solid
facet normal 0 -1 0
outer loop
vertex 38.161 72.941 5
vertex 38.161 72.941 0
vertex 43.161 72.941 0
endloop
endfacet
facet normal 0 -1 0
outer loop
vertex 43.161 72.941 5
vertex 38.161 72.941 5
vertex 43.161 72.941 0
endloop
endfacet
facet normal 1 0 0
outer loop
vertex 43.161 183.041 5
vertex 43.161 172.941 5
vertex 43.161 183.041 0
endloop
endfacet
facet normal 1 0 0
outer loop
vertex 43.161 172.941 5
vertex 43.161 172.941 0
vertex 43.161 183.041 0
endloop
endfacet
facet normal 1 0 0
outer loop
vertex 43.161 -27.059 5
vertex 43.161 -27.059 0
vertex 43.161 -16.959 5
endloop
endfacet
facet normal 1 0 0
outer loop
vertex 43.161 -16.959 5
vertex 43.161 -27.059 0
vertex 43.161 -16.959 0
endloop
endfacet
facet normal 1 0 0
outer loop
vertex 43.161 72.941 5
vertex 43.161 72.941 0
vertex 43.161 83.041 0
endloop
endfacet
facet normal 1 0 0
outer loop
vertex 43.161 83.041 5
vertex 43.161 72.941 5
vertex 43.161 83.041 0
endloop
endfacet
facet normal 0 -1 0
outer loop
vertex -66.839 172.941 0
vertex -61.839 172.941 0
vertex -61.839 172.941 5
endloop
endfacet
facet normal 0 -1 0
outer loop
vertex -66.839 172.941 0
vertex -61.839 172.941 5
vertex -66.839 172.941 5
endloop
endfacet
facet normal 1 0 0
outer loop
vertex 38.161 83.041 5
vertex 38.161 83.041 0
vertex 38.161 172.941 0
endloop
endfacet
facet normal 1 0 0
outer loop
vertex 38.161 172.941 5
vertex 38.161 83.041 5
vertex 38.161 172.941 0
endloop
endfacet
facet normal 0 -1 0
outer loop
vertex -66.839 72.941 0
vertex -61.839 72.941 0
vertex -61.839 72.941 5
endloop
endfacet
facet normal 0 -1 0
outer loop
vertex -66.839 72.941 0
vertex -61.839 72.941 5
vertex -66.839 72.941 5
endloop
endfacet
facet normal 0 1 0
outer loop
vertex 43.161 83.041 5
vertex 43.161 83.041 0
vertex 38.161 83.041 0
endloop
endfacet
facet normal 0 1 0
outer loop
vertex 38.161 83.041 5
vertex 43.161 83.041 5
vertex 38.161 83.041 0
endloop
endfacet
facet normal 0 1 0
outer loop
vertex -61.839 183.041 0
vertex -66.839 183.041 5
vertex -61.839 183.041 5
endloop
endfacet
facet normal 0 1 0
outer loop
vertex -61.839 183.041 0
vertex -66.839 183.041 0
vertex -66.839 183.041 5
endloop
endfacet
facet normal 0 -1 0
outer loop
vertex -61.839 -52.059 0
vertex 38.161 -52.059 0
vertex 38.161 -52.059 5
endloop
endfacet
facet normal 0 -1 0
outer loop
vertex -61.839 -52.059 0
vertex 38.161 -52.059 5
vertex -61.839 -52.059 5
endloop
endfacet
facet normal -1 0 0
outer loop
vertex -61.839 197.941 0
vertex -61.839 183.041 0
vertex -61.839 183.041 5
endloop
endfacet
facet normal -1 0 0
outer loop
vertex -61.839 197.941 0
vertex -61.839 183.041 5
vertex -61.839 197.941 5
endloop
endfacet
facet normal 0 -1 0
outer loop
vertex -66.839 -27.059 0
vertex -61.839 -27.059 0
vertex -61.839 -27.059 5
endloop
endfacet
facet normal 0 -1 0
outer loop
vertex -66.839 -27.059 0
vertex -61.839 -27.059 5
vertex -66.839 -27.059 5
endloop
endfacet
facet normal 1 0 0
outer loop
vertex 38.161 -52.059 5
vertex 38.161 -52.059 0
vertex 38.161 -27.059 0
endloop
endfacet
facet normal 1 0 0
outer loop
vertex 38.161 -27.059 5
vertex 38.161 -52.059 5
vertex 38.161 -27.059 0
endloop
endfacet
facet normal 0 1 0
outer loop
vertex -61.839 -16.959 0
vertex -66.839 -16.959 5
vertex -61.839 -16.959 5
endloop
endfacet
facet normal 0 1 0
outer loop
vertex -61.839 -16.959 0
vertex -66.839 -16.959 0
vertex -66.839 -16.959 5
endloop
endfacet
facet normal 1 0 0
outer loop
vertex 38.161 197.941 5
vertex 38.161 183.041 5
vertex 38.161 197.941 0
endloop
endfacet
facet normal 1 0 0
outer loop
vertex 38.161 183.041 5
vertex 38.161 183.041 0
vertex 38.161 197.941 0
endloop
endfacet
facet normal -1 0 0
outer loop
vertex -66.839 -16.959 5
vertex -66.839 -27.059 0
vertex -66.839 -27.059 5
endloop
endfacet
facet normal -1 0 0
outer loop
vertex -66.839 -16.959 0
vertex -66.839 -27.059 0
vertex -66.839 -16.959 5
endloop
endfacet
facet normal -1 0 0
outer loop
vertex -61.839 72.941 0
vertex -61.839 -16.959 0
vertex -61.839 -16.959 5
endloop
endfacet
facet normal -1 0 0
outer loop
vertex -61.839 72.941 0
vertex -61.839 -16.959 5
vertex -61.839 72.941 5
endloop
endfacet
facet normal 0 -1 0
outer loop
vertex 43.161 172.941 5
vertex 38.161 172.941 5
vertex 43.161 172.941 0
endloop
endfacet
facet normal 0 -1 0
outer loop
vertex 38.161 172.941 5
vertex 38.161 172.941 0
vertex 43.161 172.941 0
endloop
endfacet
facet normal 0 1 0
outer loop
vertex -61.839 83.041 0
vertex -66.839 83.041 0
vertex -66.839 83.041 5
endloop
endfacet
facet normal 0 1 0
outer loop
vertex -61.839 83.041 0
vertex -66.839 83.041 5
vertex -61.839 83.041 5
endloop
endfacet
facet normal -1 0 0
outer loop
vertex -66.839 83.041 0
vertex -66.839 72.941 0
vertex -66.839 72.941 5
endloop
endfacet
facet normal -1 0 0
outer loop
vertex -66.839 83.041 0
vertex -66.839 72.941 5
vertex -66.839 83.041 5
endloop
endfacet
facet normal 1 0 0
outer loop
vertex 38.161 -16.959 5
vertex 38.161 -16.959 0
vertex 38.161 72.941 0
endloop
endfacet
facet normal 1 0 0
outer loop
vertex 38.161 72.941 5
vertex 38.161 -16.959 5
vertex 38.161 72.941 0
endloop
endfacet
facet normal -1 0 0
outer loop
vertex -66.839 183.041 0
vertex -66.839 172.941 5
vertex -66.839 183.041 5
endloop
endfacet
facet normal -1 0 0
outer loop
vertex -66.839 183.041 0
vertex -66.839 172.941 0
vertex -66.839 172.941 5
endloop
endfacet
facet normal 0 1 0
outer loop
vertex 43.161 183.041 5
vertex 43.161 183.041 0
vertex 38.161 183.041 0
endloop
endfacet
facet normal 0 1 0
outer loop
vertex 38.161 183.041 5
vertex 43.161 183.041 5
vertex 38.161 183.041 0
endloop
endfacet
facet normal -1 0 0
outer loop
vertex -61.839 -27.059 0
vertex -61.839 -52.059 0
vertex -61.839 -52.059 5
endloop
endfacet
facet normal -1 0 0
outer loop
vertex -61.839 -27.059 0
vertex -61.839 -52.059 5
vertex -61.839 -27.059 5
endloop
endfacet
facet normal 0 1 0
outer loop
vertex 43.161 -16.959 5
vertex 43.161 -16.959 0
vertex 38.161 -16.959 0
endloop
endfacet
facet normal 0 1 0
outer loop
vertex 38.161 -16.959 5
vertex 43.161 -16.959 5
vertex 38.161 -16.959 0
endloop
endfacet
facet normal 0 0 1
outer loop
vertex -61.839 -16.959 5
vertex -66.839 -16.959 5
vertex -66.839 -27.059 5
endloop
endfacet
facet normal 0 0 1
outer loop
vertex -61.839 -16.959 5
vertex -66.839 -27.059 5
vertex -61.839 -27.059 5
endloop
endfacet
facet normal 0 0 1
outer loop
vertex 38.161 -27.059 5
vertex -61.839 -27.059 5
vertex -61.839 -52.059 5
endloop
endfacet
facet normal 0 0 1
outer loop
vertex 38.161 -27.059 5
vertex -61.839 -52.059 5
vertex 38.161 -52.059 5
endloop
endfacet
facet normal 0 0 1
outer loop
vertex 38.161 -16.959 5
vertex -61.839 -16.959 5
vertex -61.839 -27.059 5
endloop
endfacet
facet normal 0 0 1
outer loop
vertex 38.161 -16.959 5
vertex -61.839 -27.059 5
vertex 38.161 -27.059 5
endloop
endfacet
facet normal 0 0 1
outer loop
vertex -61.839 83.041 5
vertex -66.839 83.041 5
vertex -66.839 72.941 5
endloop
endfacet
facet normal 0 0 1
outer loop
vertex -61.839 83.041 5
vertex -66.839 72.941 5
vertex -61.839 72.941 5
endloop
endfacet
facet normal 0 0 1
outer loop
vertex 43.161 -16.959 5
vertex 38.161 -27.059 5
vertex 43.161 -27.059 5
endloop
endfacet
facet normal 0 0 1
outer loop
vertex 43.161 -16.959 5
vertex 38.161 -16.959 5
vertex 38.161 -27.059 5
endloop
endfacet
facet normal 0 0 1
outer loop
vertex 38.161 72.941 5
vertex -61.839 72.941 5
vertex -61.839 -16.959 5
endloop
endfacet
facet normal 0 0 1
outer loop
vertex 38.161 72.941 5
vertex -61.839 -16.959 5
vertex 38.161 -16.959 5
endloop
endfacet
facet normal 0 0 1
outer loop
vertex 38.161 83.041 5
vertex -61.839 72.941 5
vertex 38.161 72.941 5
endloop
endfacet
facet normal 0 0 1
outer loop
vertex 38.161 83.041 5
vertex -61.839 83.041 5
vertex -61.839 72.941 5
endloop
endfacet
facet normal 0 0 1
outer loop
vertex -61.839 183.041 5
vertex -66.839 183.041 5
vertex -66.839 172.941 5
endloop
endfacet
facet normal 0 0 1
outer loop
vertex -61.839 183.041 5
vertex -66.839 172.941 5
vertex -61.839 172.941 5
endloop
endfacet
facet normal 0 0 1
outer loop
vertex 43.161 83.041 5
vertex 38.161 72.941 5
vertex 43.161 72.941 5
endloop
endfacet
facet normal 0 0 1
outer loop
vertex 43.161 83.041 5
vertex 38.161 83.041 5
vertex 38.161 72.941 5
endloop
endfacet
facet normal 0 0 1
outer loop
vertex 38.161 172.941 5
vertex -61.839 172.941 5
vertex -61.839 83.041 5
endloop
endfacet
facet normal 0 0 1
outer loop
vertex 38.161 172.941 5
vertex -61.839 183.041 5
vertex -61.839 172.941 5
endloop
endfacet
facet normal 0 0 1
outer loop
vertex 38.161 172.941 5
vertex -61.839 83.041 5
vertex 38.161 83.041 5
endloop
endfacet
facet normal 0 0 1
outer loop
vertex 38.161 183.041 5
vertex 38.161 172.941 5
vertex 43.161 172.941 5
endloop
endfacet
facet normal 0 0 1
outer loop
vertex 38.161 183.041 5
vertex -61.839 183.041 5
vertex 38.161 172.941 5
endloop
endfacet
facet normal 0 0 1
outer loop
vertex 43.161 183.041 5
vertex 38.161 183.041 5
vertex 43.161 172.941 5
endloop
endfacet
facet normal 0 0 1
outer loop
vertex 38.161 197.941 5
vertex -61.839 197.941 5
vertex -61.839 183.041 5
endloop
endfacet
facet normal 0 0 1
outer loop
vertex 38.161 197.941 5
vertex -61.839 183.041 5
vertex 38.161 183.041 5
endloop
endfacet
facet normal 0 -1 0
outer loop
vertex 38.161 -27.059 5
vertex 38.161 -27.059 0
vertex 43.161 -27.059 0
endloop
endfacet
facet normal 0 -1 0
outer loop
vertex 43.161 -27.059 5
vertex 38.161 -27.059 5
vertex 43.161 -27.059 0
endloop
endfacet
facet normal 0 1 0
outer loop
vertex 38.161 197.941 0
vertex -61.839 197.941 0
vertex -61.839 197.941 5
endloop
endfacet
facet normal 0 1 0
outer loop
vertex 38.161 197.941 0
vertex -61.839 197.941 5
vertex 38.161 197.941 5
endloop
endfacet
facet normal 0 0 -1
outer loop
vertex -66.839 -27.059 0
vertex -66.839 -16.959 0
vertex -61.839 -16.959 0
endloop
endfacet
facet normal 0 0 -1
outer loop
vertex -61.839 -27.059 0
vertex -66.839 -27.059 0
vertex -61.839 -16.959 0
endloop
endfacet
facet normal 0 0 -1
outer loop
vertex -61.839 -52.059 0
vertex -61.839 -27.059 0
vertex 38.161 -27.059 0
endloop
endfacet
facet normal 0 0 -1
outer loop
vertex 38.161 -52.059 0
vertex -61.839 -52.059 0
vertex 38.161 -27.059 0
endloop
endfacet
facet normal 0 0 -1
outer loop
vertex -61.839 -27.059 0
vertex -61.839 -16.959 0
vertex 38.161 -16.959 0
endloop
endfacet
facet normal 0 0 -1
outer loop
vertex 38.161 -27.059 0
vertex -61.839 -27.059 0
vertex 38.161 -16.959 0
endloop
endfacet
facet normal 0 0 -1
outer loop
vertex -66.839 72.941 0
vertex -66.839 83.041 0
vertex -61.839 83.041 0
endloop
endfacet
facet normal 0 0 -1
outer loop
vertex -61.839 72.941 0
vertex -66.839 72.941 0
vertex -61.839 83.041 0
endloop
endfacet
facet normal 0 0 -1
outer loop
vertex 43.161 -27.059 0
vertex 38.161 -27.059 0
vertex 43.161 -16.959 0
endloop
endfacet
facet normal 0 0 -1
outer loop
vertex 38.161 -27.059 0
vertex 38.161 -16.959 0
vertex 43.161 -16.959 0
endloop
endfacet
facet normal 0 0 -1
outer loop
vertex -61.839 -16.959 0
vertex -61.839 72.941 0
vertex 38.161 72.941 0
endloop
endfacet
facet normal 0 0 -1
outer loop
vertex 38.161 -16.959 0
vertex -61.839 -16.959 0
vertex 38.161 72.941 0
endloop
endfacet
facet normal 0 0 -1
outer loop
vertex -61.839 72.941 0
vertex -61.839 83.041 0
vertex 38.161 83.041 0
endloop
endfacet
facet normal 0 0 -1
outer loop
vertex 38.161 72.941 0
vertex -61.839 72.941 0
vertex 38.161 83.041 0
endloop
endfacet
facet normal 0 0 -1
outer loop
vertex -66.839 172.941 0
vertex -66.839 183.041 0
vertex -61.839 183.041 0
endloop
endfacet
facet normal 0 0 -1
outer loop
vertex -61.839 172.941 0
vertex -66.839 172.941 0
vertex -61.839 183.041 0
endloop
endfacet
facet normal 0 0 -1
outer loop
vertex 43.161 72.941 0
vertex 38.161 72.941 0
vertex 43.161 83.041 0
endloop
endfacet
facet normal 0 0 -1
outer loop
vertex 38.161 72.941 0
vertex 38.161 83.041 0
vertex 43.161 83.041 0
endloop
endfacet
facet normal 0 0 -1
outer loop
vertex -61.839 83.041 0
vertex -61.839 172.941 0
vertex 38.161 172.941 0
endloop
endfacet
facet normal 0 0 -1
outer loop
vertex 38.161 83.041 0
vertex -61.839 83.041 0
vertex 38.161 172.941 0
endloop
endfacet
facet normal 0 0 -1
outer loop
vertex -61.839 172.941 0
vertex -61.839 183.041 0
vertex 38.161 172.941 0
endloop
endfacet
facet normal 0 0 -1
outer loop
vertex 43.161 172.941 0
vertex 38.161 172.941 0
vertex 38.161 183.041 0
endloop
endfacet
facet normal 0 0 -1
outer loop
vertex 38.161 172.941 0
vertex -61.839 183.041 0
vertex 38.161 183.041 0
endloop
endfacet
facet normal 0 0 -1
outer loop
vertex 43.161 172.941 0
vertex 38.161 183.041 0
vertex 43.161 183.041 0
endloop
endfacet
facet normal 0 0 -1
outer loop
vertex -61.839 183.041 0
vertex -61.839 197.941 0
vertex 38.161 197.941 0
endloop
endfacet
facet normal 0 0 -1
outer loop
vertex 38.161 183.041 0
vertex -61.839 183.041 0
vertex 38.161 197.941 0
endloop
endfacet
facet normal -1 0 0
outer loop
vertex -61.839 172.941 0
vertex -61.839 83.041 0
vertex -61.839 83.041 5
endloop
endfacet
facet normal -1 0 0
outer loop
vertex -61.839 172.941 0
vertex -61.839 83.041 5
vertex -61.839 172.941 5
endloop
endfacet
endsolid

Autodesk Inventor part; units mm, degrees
ref_plane "YZ Plane" through (0, 0, 0) normal (1, 0, 0) x (0, 1, 0)
ref_plane "XZ Plane" through (0, 0, 0) normal (0, 1, 0) x (-1, 0, 0)
ref_plane "XY Plane" through (0, 0, 0) normal (0, 0, 1) x (1, 0, 0)
sketch "Sketch1" plane through (0, 0, 0) normal (0, 0, 1) x (1, 0, 0)
  line L0 (-61.8393, -52.0586) -> (-61.8393, 197.9414)
  line L1 (-11.8393, -52.0586) -> (-11.8393, 197.9414) construction
  line L2 (38.1607, -52.0586) -> (38.1607, 145.9423)
  line L3 (38.1607, -52.0586) -> (-61.8393, -52.0586)
  line L4 (43.1607, 183.0414) -> (38.1607, 183.0414)
  line L5 (43.1607, 172.9414) -> (43.1607, 183.0414)
  line L6 (38.1607, 172.9414) -> (43.1607, 172.9414)
  line L7 (43.1607, -16.9586) -> (38.1607, -16.9586)
  line L8 (43.1607, -27.0586) -> (43.1607, -16.9586)
  line L9 (38.1607, -27.0586) -> (43.1607, -27.0586)
  line L10 (-61.8393, 83.0414) -> (-61.8393, 72.9414)
  line L11 (-61.8393, 72.9414) -> (38.1607, 72.9414) construction
  line L12 (38.1607, 72.9414) -> (43.1607, 72.9414)
  line L13 (38.1607, 72.9414) -> (43.1607, 72.9414)
  line L14 (43.1607, 72.9414) -> (43.1607, 83.0414)
  line L15 (43.1607, 72.9414) -> (43.1607, 83.0414)
  line L16 (43.1607, 83.0414) -> (38.1607, 83.0414)
  line L17 (43.1607, 83.0414) -> (38.1607, 83.0414)
  line L18 (38.1607, 145.9423) -> (38.1607, 197.9414)
  line L19 (38.1607, 197.9414) -> (38.1607, 147.9414)
  line L20 (38.1607, 147.9414) -> (-61.8393, 147.9414) construction
  line L21 (-66.8393, -27.0586) -> (-66.8393, -16.9586)
  line L22 (-66.8393, -16.9586) -> (-61.8393, -16.9586)
  line L23 (-61.8393, -27.0586) -> (-66.8393, -27.0586)
  line L24 (-66.8393, 83.0414) -> (-61.8393, 83.0414)
  line L25 (-66.8393, 72.9414) -> (-66.8393, 83.0414)
  line L26 (-61.8393, 72.9414) -> (-66.8393, 72.9414)
  line L27 (-66.8393, 172.9414) -> (-66.8393, 183.0414)
  line L28 (-66.8393, 183.0414) -> (-61.8393, 183.0414)
  line L29 (-61.8393, 172.9414) -> (-66.8393, 172.9414)
  line L30 (-61.8393, 197.9414) -> (38.1607, 197.9414)
  line L31 (38.1607, 197.9414) -> (28.1607, 197.9414)
  line L32 (38.1607, 149.2033) -> (38.1607, 197.9414)
  line L33 (-61.8393, 197.9414) -> (-51.8393, 197.9414)
  line L34 (-61.8393, 149.2728) -> (-61.8393, 197.9414)
  line L35 (-61.8393, 147.9414) -> (38.1607, 147.9414) construction
  line L36 (28.1607, 145.2728) -> (28.1607, 139.2728)
  line L37 (17.1607, 145.2728) -> (17.1607, 139.2728)
  line L38 (-40.8393, 145.2728) -> (-40.8393, 139.2728)
  line L39 (-51.8393, 145.2728) -> (-51.8393, 139.2728)
  line L40 (17.1607, 145.2728) -> (-40.8393, 145.2728) construction
  line L41 (17.1607, 139.2728) -> (-40.8393, 139.2728) construction
  line L42 (28.1607, 139.2728) -> (17.1607, 139.2728)
  line L43 (28.1607, 145.2728) -> (17.1607, 145.2728)
  line L44 (-40.8393, 145.2728) -> (-51.8393, 145.2728)
  line L45 (-40.8393, 139.2728) -> (-51.8393, 139.2728)
  line L46 (-51.8393, 139.2728) -> (-61.8393, 139.2728) construction
  line L47 (-51.8393, 145.2728) -> (-61.8393, 145.2728) construction
  dimension "d8" = 10
  dimension "d9" = 11
extrude "Extrusion1" add sketch "Sketch1" along normal blind 5 contours L0 L30 L18 L2 L3 | L23 L21 L22 L0 | L2 L7 L8 L9 | L26 L25 L24 L0 | L2 L16 L14 L12 | L29 L27 L28 L0 | L18 L4 L5 L6 | L36 L42 L37 L43 | L38 L45 L39 L44
properties part number "Lifting Sections all back"
